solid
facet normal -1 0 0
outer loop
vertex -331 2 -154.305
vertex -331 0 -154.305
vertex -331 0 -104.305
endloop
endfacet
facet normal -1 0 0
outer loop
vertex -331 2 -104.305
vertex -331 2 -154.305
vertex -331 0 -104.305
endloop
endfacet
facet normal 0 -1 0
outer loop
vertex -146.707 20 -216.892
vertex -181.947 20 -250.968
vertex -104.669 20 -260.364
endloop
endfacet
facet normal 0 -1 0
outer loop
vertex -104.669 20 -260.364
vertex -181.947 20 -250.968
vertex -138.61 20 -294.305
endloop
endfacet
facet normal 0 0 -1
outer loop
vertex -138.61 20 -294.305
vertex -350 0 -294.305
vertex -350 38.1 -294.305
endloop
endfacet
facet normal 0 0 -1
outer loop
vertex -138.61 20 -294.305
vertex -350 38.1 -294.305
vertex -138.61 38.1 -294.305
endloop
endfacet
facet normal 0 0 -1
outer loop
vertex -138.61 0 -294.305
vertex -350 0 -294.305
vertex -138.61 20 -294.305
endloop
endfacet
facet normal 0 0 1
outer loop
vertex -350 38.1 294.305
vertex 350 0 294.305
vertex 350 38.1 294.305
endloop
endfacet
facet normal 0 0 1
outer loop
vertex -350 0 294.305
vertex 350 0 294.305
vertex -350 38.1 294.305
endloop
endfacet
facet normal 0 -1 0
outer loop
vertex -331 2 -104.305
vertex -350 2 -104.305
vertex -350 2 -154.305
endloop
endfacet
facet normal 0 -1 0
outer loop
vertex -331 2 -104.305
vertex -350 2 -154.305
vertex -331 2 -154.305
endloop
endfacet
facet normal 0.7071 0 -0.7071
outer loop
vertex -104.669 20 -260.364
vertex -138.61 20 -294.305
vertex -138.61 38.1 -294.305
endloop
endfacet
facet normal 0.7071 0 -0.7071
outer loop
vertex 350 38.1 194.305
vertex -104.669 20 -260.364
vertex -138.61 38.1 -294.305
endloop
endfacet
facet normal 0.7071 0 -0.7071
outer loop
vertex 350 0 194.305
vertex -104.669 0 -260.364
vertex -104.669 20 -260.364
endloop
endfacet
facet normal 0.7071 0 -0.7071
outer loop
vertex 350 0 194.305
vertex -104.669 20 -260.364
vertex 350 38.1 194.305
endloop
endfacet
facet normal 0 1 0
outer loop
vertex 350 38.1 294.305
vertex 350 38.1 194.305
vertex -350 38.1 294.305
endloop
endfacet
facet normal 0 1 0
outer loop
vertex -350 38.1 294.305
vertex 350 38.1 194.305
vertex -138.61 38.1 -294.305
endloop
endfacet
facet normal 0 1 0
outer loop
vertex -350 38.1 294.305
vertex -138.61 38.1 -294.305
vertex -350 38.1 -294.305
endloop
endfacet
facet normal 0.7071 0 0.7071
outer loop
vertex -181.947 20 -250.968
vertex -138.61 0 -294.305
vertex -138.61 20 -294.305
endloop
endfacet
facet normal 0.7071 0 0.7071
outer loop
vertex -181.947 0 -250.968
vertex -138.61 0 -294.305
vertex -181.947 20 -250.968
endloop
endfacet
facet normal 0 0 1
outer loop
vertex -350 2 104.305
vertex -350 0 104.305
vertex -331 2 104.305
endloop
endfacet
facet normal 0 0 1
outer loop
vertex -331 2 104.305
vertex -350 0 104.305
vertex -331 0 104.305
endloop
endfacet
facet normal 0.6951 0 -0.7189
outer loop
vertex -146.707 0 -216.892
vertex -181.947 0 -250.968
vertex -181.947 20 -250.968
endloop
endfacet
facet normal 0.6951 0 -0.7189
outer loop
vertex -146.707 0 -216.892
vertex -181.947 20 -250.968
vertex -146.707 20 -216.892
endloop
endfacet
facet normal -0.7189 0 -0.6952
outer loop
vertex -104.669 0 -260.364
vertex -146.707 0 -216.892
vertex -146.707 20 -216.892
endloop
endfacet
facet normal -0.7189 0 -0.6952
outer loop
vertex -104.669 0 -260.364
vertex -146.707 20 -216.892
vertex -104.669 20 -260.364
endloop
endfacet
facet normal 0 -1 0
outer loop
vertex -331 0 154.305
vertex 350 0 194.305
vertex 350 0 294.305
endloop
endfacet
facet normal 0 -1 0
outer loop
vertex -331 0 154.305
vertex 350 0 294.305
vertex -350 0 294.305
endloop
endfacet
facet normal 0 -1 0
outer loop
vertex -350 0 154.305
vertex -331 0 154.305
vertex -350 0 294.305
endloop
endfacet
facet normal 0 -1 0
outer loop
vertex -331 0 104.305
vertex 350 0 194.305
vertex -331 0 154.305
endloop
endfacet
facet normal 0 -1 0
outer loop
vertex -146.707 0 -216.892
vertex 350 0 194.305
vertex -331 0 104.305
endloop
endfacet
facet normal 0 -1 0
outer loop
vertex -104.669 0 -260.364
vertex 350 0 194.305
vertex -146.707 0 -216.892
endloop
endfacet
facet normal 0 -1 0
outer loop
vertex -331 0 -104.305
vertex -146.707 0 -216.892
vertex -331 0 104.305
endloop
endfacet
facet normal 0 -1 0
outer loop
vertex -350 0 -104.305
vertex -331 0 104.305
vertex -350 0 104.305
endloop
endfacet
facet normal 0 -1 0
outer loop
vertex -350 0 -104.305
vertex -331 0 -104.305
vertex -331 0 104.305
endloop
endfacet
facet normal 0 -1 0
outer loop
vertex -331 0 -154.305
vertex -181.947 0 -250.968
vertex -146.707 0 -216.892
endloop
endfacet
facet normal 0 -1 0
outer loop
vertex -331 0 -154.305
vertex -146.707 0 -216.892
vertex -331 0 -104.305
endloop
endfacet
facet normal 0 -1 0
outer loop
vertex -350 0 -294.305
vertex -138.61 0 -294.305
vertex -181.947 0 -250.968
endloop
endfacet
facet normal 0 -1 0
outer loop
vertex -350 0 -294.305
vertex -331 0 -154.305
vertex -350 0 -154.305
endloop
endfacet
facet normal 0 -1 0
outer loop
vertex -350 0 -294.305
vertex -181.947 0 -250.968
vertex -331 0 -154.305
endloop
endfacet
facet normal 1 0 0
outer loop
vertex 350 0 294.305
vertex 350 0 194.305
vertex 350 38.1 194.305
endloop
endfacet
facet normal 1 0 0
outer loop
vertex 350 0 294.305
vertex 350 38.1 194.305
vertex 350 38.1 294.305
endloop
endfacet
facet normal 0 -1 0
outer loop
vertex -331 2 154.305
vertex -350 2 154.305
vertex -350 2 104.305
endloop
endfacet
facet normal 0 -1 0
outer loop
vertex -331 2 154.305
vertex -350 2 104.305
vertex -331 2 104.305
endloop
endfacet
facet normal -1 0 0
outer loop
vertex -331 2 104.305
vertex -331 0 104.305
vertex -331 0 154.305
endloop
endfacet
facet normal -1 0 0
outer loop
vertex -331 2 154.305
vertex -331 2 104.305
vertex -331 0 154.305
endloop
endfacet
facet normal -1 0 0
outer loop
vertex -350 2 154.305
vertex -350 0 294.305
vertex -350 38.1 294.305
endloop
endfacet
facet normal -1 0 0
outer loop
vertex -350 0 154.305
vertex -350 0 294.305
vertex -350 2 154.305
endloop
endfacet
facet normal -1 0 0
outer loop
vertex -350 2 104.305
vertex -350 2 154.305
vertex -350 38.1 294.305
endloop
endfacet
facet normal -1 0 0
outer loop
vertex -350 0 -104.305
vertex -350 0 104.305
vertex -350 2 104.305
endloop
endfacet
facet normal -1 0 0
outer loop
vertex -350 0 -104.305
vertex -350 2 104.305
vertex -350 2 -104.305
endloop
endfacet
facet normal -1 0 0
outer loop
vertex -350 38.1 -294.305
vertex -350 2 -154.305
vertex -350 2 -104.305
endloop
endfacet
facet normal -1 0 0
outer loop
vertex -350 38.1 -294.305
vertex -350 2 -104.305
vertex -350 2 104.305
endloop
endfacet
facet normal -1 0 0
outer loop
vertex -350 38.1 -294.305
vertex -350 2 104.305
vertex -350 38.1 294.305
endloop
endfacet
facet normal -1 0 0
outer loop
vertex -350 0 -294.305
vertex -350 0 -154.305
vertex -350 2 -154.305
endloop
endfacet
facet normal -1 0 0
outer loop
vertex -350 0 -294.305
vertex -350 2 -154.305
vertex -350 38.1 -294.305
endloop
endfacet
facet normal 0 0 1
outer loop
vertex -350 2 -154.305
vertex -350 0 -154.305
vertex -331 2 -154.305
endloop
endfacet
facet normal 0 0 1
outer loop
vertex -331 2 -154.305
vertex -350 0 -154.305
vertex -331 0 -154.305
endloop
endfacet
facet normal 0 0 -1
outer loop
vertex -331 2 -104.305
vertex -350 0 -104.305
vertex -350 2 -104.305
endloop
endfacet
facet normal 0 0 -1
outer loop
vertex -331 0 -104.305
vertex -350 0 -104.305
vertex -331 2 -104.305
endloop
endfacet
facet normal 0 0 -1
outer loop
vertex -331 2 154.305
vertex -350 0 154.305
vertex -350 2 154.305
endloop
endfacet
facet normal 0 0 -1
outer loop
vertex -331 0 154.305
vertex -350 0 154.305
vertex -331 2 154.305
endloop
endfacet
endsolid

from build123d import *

# Parameters (mm, degrees)
BOSS_EXTRUDE1_DEPTH = 38.1
SKETCH2_W           = 19
SKETCH2_H           = 50
CUT_EXTRUDE1_DEPTH  = 2
CUT_EXTRUDE2_DEPTH  = 20


with BuildPart() as part:
    # Sketch1 → Boss-Extrude1 (new body)
    with BuildSketch(Plane(origin=(0, 0, 0), x_dir=(1, 0, 0), z_dir=(0, 1, 0))):
        Polygon((-138.61, 294.305), (350, -194.305), (350, -294.305), (-350, -294.305), (-350, 294.305), align=None)
    extrude(amount=BOSS_EXTRUDE1_DEPTH)

    # Sketch2 → Cut-Extrude1 (cut)
    with BuildSketch(Plane.XZ):
        with Locations((-340.5, -129.305)):
            Rectangle(SKETCH2_W, SKETCH2_H)
        with Locations((-340.5, 129.305)):
            Rectangle(SKETCH2_W, SKETCH2_H)
    extrude(amount=-CUT_EXTRUDE1_DEPTH, mode=Mode.SUBTRACT)

    # Sketch3 → Cut-Extrude2 (cut)
    with BuildSketch(Plane(origin=(0, 0, 0), x_dir=(1, 0, 0), z_dir=(0, 1, 0))):
        Polygon((-138.61, 294.305), (-181.946540118, 250.968459882), (-146.706941406, 216.891522613), (-104.668874503, 260.363874503), align=None)
    extrude(amount=CUT_EXTRUDE2_DEPTH, mode=Mode.SUBTRACT)


solid = part.part
